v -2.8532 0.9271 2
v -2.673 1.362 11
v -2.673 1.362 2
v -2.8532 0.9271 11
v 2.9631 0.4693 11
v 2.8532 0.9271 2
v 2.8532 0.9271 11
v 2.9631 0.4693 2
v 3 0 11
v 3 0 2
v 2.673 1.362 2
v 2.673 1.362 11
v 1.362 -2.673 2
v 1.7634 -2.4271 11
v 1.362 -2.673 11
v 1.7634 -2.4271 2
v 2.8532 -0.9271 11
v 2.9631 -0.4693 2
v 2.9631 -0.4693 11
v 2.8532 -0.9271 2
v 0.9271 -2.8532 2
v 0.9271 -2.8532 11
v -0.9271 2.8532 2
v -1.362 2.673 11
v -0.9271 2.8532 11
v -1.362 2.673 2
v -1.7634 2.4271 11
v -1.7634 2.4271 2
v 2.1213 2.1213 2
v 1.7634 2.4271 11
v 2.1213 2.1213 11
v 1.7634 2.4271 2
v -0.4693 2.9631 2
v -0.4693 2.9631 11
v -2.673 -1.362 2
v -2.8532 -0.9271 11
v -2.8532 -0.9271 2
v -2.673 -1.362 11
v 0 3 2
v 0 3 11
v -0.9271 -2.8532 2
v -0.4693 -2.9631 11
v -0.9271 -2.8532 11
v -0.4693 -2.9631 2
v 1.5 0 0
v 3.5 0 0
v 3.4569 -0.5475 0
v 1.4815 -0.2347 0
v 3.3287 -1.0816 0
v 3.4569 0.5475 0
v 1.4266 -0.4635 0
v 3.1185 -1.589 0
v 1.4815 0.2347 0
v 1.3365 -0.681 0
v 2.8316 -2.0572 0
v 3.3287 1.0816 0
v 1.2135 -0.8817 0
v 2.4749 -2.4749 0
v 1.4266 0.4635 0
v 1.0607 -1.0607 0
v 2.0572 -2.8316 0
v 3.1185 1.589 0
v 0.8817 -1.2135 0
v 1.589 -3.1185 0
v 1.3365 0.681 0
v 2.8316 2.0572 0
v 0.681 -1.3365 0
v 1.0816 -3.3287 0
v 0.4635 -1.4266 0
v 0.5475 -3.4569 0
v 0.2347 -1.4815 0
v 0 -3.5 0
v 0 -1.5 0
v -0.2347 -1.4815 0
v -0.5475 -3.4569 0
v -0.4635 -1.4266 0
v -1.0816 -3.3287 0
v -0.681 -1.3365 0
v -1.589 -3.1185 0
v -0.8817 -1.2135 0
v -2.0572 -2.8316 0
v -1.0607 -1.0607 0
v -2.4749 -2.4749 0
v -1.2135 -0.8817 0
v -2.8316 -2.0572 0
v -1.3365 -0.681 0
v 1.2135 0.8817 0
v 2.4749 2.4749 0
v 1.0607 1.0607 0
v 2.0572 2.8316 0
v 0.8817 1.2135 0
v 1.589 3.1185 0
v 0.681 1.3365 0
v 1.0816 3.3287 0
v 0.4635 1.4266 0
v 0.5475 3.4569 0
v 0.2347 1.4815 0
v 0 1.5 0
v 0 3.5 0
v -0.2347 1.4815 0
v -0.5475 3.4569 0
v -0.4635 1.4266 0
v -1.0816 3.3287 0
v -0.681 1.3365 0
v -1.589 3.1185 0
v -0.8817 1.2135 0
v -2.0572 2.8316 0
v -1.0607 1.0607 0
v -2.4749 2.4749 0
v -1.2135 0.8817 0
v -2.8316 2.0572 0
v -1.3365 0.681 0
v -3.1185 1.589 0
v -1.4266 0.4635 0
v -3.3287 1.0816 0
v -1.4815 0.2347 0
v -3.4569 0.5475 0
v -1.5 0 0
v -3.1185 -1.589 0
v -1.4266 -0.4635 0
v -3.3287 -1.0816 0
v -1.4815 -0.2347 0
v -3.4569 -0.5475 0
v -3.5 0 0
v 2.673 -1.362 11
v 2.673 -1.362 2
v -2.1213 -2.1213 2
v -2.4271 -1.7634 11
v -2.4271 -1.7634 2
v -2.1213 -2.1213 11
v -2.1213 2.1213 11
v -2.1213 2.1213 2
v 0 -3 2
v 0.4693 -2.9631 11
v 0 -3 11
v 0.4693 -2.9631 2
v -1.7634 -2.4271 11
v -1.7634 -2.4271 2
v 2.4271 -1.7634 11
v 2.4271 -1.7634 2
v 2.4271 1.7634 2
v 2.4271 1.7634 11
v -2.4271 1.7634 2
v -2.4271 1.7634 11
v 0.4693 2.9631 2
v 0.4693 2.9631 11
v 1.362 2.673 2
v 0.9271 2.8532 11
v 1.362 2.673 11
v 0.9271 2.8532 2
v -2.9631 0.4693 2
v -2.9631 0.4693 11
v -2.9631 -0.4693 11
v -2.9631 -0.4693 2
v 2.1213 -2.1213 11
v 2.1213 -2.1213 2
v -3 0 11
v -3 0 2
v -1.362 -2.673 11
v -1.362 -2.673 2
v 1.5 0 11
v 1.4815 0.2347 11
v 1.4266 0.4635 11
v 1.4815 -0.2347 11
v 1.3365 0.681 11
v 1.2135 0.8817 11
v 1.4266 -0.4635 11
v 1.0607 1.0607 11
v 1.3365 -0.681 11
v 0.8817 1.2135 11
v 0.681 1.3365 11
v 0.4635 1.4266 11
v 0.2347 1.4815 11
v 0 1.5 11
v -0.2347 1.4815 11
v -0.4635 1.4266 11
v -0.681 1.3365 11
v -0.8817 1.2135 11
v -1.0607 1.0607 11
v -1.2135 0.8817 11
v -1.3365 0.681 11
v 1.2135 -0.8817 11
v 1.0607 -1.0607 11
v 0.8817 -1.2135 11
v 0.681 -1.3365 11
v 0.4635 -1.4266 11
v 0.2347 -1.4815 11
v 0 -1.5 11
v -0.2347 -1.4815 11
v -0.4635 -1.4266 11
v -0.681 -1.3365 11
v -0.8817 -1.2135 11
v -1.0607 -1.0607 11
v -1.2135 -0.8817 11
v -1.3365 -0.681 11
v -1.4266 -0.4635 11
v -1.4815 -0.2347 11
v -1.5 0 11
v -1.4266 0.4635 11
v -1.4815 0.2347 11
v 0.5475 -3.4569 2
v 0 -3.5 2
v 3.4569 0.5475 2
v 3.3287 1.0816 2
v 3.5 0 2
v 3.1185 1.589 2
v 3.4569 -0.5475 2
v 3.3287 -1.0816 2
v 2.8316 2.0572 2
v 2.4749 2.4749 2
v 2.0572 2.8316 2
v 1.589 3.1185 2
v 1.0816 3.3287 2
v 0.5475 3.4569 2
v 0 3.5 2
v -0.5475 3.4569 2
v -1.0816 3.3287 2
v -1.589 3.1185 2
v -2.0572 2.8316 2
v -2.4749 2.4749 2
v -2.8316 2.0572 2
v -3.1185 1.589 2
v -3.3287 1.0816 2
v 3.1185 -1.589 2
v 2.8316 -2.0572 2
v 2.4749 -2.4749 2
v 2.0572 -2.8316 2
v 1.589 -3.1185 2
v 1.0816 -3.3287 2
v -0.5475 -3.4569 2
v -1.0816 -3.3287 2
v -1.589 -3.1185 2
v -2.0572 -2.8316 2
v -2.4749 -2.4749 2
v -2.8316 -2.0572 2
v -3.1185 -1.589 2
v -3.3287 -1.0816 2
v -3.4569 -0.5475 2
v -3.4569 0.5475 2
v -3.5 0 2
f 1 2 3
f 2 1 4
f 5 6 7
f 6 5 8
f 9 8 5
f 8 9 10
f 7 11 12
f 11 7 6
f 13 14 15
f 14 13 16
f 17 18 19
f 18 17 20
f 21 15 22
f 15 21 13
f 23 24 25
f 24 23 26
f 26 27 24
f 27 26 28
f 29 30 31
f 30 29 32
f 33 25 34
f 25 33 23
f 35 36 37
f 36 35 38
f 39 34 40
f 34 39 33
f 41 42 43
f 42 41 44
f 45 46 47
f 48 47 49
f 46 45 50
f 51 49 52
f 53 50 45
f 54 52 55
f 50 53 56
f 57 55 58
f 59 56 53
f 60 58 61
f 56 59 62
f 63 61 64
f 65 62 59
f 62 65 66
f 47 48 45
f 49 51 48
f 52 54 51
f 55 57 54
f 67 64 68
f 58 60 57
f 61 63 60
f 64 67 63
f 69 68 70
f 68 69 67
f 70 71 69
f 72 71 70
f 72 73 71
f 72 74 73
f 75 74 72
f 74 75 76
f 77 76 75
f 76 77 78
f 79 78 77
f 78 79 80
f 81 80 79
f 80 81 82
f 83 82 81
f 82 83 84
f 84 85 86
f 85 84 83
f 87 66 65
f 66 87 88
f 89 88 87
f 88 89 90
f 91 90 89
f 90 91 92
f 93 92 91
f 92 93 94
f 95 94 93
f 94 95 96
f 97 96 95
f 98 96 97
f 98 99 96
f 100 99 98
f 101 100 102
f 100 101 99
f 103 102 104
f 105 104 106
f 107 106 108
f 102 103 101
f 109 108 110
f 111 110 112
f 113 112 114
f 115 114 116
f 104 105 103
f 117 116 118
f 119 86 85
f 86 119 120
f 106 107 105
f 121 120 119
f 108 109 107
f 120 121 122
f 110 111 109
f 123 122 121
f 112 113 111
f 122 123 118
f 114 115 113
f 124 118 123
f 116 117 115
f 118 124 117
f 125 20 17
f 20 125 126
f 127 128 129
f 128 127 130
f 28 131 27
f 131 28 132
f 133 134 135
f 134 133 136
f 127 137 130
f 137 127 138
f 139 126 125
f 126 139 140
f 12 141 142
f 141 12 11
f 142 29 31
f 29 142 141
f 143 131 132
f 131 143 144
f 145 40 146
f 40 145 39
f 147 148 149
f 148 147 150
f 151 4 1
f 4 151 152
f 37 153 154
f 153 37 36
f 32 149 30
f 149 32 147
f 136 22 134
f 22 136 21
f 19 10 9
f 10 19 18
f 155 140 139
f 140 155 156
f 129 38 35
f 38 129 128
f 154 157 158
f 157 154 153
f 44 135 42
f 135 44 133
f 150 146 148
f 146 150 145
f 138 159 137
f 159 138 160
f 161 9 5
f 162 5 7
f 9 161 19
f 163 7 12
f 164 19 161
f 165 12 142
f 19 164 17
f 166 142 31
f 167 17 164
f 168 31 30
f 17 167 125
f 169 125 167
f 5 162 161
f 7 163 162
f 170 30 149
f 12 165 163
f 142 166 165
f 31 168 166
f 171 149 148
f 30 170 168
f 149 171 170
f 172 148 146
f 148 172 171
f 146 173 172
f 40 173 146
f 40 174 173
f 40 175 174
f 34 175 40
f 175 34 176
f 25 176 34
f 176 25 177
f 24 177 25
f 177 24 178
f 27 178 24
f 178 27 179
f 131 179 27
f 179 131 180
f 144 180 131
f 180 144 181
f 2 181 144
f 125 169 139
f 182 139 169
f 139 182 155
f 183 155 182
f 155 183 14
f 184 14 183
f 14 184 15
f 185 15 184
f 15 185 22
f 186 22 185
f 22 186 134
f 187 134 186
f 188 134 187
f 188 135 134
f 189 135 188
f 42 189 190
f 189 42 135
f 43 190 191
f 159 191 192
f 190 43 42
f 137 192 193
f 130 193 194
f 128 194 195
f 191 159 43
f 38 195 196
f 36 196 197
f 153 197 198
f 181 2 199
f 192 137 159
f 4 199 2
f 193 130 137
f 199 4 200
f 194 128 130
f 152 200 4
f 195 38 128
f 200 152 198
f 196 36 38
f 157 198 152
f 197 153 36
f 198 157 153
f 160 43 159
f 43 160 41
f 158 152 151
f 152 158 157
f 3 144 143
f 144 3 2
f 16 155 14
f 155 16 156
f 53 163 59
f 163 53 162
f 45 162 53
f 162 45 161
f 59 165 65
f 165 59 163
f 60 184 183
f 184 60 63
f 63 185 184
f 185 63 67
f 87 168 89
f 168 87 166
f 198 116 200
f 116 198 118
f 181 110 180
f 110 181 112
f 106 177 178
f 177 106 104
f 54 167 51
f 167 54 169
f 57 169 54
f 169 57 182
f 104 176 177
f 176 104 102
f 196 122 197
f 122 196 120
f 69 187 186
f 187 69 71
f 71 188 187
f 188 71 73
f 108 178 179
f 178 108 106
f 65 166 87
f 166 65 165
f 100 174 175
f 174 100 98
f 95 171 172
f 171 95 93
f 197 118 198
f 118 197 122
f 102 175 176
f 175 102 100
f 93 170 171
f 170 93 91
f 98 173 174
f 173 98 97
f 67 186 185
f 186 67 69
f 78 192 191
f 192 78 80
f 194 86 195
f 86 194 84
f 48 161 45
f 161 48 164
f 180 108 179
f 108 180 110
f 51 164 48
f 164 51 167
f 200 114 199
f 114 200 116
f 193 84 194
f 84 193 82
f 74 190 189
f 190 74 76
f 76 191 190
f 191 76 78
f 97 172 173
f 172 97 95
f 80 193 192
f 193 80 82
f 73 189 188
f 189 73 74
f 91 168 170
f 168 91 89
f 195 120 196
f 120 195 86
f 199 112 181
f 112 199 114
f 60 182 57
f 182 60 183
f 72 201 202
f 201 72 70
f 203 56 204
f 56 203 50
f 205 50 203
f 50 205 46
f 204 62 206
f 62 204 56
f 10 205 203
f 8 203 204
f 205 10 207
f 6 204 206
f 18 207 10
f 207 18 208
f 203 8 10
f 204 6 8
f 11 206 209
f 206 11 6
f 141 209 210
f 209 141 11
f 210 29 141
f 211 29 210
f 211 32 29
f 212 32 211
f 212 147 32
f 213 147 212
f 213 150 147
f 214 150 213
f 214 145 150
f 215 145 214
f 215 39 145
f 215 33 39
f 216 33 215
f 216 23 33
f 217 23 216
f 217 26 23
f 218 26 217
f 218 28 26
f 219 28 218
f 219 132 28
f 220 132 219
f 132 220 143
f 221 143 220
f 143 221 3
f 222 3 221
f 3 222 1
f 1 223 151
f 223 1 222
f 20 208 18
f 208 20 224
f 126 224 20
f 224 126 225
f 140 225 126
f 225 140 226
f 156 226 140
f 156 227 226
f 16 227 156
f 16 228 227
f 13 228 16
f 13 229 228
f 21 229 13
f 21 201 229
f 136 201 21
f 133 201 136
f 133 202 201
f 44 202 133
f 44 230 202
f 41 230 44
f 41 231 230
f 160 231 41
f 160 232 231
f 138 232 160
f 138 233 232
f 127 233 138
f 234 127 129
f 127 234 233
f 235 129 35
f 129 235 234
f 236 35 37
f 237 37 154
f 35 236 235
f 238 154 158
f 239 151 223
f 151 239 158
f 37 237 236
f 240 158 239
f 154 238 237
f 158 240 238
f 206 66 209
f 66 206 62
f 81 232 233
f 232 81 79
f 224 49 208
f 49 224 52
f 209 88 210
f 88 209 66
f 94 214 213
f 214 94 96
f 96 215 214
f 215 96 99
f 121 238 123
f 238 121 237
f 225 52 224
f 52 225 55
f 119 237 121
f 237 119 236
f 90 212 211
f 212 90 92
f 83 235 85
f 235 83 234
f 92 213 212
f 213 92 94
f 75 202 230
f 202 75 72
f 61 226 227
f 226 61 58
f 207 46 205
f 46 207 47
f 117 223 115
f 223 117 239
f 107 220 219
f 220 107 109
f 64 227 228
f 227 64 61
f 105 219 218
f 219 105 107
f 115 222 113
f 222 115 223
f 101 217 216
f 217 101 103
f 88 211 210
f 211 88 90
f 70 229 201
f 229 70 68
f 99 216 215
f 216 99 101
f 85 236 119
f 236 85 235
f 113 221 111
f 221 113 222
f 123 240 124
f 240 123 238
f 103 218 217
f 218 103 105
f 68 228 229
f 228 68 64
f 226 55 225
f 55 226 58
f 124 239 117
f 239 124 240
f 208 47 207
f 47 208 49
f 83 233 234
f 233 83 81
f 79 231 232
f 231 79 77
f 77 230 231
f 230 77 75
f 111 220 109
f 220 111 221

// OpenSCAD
$fn=40;
difference() {
cylinder(h=11,r=3);
cylinder(h=11,r=1.5);
}
difference() {
cylinder(h=2,r=3.5);
cylinder(h=3,r=1.5);
}
